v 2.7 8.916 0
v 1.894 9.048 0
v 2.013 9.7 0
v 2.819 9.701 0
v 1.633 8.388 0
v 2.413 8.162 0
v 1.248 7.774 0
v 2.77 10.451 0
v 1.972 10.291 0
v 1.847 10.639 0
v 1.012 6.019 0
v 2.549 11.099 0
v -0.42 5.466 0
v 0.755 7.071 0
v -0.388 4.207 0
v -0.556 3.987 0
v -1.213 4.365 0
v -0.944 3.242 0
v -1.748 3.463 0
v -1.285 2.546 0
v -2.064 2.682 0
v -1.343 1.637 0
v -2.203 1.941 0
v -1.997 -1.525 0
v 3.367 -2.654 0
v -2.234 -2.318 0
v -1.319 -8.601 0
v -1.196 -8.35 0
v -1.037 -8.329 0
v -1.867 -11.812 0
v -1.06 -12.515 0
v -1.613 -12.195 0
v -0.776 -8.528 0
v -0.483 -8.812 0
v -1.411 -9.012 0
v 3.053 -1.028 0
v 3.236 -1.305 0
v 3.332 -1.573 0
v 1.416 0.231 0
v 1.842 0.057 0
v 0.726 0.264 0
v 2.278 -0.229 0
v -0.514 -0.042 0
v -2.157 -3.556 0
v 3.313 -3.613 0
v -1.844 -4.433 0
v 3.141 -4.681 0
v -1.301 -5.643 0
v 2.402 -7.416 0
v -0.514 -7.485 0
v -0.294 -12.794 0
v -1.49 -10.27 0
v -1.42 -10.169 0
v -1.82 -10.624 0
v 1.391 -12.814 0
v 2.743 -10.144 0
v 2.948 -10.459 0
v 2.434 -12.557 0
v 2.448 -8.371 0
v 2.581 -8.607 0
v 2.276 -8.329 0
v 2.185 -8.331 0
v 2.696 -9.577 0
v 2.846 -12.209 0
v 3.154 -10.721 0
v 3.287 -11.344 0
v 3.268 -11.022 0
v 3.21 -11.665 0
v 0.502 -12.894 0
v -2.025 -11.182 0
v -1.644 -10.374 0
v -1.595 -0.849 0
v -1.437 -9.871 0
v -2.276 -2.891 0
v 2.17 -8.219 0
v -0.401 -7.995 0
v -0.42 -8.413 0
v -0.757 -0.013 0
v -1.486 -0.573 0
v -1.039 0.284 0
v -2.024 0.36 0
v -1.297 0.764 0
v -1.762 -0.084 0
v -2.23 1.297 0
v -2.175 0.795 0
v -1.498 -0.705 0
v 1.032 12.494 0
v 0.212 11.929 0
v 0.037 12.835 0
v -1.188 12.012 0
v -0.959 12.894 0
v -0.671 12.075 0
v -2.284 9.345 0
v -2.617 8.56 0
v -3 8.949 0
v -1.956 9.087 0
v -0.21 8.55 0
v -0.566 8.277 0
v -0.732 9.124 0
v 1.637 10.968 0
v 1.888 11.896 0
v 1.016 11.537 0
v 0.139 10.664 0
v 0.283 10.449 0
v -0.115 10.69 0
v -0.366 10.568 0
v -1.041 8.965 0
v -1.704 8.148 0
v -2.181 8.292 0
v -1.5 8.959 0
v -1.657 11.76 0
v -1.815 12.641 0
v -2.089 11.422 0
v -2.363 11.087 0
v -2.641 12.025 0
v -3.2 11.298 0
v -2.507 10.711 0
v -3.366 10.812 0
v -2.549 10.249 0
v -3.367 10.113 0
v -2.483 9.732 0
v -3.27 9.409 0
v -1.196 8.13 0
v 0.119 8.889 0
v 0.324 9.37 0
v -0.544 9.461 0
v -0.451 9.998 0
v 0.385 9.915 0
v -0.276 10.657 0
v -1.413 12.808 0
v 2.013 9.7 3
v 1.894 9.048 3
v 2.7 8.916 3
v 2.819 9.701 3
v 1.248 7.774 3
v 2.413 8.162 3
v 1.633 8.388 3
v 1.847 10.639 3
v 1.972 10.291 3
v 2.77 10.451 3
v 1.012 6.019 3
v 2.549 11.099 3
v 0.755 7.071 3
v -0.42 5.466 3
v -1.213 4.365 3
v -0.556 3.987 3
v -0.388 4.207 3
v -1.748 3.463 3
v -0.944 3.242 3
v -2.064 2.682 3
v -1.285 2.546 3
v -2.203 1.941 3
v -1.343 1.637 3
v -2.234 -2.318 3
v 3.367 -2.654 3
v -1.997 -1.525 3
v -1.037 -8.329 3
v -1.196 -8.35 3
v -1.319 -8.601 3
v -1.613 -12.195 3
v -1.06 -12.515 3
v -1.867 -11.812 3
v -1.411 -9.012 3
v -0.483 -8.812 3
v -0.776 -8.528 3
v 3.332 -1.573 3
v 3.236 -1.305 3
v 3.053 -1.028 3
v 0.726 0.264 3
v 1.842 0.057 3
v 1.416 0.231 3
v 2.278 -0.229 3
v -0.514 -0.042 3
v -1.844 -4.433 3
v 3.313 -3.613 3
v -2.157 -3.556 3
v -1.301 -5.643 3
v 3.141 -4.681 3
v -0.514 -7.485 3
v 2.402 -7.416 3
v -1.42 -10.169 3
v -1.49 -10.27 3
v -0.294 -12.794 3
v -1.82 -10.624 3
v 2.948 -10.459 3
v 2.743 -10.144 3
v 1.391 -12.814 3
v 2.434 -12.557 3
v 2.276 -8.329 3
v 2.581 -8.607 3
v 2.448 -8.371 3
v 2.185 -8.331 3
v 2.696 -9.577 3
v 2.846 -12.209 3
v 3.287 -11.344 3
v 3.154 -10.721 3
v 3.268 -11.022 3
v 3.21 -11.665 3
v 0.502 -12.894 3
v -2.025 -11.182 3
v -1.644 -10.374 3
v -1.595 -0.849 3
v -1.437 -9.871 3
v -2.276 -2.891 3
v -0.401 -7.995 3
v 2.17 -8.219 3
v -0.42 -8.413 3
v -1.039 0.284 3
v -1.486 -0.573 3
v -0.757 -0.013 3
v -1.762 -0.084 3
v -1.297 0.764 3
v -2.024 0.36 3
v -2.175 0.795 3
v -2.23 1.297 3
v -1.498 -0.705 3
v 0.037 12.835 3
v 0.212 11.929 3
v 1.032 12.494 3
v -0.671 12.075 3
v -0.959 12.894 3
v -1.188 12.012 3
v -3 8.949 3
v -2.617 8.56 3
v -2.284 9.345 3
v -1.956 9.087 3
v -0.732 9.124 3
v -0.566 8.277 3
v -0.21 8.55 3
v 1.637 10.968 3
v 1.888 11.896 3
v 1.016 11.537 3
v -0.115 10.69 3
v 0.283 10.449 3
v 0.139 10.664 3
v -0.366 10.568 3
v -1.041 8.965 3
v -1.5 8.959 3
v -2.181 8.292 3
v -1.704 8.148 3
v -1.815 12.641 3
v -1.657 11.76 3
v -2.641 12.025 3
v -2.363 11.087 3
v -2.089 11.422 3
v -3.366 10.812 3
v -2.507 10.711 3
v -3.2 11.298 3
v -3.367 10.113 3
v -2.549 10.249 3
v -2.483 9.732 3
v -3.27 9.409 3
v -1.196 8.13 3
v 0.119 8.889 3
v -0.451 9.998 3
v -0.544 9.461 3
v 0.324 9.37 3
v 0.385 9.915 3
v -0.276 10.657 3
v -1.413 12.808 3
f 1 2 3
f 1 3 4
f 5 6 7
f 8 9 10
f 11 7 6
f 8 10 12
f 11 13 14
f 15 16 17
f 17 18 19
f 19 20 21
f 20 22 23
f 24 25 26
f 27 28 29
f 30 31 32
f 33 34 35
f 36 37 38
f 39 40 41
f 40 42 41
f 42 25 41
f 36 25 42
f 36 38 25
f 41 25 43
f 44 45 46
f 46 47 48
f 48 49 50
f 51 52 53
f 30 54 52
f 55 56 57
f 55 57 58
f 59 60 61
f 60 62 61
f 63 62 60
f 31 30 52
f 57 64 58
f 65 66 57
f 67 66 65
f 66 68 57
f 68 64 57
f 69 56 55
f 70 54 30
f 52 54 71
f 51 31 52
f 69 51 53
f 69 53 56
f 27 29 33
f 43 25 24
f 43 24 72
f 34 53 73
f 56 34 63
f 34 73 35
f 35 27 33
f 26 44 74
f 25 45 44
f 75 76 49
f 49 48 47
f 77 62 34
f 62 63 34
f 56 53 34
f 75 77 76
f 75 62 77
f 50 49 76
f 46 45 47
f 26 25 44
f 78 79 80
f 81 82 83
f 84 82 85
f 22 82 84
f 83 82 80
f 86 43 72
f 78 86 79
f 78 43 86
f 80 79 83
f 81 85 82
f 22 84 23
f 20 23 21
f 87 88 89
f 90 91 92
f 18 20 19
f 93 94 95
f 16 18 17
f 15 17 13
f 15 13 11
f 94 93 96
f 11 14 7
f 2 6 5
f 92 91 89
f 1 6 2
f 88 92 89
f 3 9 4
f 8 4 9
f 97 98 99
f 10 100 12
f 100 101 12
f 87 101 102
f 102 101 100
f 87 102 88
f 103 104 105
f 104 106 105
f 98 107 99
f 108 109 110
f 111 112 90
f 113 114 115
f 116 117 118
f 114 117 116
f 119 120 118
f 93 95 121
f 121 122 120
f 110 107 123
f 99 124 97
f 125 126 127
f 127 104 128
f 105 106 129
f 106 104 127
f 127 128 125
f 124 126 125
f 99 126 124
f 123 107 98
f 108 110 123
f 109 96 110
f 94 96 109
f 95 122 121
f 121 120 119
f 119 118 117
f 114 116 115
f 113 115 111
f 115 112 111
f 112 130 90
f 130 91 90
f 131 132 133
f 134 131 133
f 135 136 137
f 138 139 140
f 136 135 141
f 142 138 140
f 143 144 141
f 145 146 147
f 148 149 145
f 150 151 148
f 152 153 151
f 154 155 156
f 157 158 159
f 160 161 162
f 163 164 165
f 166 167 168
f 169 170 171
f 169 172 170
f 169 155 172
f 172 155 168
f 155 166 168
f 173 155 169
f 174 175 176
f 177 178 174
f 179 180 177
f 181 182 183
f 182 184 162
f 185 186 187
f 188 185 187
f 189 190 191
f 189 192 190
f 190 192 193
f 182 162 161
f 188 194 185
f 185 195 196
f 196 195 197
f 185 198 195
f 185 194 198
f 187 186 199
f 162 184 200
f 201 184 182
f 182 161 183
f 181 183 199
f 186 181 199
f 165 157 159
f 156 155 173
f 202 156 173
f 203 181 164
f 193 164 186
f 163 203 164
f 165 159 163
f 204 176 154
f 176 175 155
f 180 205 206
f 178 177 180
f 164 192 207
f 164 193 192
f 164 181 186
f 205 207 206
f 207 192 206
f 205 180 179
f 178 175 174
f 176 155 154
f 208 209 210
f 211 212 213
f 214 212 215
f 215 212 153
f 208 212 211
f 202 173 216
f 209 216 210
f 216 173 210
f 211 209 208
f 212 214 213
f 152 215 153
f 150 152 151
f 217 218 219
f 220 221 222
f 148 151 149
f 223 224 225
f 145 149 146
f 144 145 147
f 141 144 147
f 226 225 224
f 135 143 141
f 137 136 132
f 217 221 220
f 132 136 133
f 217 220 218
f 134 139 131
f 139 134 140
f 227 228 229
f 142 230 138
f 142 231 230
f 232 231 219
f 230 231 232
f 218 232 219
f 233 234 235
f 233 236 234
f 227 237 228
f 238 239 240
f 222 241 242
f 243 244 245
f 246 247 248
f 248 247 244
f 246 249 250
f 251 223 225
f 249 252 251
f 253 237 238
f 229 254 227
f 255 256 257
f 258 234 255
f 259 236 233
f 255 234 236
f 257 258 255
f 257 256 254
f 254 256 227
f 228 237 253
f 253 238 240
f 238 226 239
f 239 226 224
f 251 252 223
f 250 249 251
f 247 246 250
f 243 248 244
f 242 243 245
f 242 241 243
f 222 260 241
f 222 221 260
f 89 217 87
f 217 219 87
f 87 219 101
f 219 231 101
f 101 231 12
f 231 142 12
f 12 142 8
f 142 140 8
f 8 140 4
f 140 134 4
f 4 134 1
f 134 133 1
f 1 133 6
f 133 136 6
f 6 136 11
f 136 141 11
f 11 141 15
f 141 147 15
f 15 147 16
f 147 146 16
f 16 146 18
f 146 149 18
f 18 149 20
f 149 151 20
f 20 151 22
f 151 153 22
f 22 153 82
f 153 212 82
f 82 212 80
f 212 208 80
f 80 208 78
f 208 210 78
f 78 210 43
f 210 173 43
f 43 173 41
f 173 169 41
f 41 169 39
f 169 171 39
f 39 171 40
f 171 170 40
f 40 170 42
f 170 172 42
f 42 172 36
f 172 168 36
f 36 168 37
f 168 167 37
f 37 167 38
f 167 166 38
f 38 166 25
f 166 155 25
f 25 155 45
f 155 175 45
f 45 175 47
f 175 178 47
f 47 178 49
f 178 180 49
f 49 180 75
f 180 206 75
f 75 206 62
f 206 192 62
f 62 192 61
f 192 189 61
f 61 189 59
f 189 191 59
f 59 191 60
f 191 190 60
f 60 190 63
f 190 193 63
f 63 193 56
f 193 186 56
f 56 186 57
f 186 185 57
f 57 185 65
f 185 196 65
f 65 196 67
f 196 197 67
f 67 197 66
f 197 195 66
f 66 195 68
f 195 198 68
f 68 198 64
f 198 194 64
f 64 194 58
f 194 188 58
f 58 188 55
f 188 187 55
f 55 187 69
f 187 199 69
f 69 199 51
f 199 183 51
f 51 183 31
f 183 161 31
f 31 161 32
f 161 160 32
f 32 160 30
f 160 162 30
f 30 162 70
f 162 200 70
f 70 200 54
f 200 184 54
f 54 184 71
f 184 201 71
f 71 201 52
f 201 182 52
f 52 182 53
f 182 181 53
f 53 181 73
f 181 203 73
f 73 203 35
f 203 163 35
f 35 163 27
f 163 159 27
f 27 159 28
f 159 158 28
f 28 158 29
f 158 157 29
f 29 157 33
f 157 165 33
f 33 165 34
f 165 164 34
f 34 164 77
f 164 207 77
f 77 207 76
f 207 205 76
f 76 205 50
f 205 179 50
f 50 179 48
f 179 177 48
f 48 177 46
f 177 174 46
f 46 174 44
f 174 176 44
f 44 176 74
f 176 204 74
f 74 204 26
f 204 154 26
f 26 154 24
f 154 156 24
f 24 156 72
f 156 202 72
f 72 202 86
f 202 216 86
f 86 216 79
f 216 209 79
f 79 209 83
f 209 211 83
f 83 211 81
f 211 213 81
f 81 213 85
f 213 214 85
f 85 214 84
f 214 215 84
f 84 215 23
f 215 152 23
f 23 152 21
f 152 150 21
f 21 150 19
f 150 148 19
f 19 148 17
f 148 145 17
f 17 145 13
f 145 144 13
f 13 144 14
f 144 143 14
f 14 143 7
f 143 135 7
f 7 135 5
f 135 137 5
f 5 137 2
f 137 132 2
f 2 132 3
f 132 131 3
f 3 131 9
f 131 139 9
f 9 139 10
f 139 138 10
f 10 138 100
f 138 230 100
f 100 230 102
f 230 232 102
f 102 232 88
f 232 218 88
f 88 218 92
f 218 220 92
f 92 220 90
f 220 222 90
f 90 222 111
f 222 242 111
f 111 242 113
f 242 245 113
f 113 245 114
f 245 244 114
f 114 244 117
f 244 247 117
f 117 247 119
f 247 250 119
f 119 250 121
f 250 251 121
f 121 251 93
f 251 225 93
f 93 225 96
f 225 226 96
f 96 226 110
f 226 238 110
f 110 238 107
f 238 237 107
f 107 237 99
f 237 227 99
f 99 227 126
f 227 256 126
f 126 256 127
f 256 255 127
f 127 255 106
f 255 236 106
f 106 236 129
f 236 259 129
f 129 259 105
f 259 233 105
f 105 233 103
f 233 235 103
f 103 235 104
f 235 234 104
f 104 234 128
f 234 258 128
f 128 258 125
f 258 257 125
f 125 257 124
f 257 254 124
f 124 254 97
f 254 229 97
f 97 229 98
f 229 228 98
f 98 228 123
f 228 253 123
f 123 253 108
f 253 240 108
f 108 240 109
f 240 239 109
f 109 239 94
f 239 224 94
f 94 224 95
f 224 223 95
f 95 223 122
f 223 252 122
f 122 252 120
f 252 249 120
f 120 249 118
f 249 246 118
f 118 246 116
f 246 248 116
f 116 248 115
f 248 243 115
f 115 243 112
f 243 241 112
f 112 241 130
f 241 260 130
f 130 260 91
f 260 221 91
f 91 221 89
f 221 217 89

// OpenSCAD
// Module names are of the form poly_<inkscape-path-id>().  As a result,
// you can associate a polygon in this OpenSCAD program with the corresponding
// SVG element in the Inkscape document by looking for the XML element with
// the attribute id="inkscape-path-id".

// fudge value is used to ensure that subtracted solids are a tad taller
// in the z dimension than the polygon being subtracted from.  This helps
// keep the resulting .stl file manifold.
fudge = 0.1;

module poly_path8(h)
{
  scale([25.4/90, -25.4/90, 1]) union()
  {
    linear_extrude(height=h)
      polygon([[-6.430524,-44.791807],[-9.357714,-42.608031],[-11.337051,-40.033962],[-11.927136,-38.310173],[-11.931782,-35.833678],[-11.587953,-33.338597],[-10.630809,-31.707735],[-9.271176,-30.329516],[-7.726851,-29.379922],[-6.036167,-28.869406],[-4.237455,-28.808423],[-2.007216,-29.328812],[-0.743413,-30.295249],[0.423397,-31.498069],[1.147644,-33.199207],[1.363118,-35.130339],[1.003608,-37.023139],[0.492511,-37.785137],[-0.408877,-37.878064],[-0.976311,-37.761325],[-1.296327,-37.445955],[-1.598338,-35.424801],[-1.928228,-33.522127],[-2.592654,-32.330343],[-3.689188,-31.765814],[-5.315404,-31.744905],[-6.931167,-32.197923],[-8.093911,-33.110927],[-8.796669,-34.483918],[-9.032470,-36.316896],[-8.883788,-37.952986],[-8.372691,-39.285903],[-7.401608,-40.472460],[-5.872964,-41.669471],[-4.209577,-42.561567],[-2.378922,-42.784591],[0.752125,-42.267687],[3.600908,-40.879595],[5.801527,-38.864248],[6.544432,-37.697583],[6.988084,-36.465579],[7.130959,-34.371245],[6.709304,-32.060856],[5.785846,-29.722589],[4.423309,-27.544621],[2.676288,-25.054186],[-1.486826,-19.367075],[-4.298438,-15.465899],[-6.193561,-12.272126],[-7.315070,-9.503492],[-7.805839,-6.877734],[-7.901669,-4.596384],[-7.708266,-2.816839],[-7.173357,-1.274257],[-6.244671,0.296204],[-5.264295,2.029286],[-5.309016,2.496823],[-5.649940,3.009662],[-7.076364,5.402523],[-7.917351,8.213554],[-8.064291,10.242840],[-7.643217,12.599692],[-6.532163,15.709250],[-4.609162,19.996653],[-1.821362,26.520104],[-1.420616,28.328689],[-1.486826,29.809708],[-1.709850,31.222193],[-2.750629,30.218585],[-3.675249,29.512342],[-4.237455,29.586684],[-4.674210,30.475876],[-4.999454,31.933082],[-5.092380,34.976429],[-5.031978,36.031147],[-5.278234,36.388915],[-5.825339,36.758298],[-6.449110,37.643424],[-7.173937,39.622762],[-6.616377,41.853002],[-5.714989,43.209731],[-3.754237,44.343436],[-1.041359,45.333685],[1.779545,45.686226],[4.928016,45.404542],[8.623593,44.492118],[10.082542,43.260840],[11.374222,41.332612],[11.647194,40.194261],[11.578661,39.055909],[11.175591,37.987253],[10.444955,37.057986],[9.720128,35.942867],[9.552860,33.935651],[9.143982,30.497365],[8.674703,29.659864],[8.066033,29.512342],[7.743694,29.519312],[7.689680,29.122051],[8.512081,26.278495],[11.127966,16.586245],[11.737217,12.802969],[11.931782,9.403015],[11.806331,5.574437],[11.466568,4.625424],[10.816662,3.641563],[8.070680,0.811947],[6.525193,-0.200373],[5.018039,-0.818916],[2.574068,-0.935074],[-1.821362,0.147521],[-2.680934,0.045302],[-3.679895,-1.004769],[-4.595223,-2.705327],[-4.757844,-5.799785],[-4.553406,-9.019693],[-3.345359,-11.486896],[-1.970045,-14.126012],[-1.375314,-14.906596],[3.586969,-21.327828],[8.549252,-28.919935],[9.565637,-31.591576],[9.989615,-34.374729],[9.814216,-37.032432],[9.032470,-39.327720],[6.690719,-42.152690],[3.657825,-44.269094],[0.130097,-45.479464],[-3.397631,-45.686226],[-5.006859,-45.382762],[-6.430524,-44.791807]]);
  }
}

module gato3(h)
{

poly_path8(h);
}

gato3(3);
